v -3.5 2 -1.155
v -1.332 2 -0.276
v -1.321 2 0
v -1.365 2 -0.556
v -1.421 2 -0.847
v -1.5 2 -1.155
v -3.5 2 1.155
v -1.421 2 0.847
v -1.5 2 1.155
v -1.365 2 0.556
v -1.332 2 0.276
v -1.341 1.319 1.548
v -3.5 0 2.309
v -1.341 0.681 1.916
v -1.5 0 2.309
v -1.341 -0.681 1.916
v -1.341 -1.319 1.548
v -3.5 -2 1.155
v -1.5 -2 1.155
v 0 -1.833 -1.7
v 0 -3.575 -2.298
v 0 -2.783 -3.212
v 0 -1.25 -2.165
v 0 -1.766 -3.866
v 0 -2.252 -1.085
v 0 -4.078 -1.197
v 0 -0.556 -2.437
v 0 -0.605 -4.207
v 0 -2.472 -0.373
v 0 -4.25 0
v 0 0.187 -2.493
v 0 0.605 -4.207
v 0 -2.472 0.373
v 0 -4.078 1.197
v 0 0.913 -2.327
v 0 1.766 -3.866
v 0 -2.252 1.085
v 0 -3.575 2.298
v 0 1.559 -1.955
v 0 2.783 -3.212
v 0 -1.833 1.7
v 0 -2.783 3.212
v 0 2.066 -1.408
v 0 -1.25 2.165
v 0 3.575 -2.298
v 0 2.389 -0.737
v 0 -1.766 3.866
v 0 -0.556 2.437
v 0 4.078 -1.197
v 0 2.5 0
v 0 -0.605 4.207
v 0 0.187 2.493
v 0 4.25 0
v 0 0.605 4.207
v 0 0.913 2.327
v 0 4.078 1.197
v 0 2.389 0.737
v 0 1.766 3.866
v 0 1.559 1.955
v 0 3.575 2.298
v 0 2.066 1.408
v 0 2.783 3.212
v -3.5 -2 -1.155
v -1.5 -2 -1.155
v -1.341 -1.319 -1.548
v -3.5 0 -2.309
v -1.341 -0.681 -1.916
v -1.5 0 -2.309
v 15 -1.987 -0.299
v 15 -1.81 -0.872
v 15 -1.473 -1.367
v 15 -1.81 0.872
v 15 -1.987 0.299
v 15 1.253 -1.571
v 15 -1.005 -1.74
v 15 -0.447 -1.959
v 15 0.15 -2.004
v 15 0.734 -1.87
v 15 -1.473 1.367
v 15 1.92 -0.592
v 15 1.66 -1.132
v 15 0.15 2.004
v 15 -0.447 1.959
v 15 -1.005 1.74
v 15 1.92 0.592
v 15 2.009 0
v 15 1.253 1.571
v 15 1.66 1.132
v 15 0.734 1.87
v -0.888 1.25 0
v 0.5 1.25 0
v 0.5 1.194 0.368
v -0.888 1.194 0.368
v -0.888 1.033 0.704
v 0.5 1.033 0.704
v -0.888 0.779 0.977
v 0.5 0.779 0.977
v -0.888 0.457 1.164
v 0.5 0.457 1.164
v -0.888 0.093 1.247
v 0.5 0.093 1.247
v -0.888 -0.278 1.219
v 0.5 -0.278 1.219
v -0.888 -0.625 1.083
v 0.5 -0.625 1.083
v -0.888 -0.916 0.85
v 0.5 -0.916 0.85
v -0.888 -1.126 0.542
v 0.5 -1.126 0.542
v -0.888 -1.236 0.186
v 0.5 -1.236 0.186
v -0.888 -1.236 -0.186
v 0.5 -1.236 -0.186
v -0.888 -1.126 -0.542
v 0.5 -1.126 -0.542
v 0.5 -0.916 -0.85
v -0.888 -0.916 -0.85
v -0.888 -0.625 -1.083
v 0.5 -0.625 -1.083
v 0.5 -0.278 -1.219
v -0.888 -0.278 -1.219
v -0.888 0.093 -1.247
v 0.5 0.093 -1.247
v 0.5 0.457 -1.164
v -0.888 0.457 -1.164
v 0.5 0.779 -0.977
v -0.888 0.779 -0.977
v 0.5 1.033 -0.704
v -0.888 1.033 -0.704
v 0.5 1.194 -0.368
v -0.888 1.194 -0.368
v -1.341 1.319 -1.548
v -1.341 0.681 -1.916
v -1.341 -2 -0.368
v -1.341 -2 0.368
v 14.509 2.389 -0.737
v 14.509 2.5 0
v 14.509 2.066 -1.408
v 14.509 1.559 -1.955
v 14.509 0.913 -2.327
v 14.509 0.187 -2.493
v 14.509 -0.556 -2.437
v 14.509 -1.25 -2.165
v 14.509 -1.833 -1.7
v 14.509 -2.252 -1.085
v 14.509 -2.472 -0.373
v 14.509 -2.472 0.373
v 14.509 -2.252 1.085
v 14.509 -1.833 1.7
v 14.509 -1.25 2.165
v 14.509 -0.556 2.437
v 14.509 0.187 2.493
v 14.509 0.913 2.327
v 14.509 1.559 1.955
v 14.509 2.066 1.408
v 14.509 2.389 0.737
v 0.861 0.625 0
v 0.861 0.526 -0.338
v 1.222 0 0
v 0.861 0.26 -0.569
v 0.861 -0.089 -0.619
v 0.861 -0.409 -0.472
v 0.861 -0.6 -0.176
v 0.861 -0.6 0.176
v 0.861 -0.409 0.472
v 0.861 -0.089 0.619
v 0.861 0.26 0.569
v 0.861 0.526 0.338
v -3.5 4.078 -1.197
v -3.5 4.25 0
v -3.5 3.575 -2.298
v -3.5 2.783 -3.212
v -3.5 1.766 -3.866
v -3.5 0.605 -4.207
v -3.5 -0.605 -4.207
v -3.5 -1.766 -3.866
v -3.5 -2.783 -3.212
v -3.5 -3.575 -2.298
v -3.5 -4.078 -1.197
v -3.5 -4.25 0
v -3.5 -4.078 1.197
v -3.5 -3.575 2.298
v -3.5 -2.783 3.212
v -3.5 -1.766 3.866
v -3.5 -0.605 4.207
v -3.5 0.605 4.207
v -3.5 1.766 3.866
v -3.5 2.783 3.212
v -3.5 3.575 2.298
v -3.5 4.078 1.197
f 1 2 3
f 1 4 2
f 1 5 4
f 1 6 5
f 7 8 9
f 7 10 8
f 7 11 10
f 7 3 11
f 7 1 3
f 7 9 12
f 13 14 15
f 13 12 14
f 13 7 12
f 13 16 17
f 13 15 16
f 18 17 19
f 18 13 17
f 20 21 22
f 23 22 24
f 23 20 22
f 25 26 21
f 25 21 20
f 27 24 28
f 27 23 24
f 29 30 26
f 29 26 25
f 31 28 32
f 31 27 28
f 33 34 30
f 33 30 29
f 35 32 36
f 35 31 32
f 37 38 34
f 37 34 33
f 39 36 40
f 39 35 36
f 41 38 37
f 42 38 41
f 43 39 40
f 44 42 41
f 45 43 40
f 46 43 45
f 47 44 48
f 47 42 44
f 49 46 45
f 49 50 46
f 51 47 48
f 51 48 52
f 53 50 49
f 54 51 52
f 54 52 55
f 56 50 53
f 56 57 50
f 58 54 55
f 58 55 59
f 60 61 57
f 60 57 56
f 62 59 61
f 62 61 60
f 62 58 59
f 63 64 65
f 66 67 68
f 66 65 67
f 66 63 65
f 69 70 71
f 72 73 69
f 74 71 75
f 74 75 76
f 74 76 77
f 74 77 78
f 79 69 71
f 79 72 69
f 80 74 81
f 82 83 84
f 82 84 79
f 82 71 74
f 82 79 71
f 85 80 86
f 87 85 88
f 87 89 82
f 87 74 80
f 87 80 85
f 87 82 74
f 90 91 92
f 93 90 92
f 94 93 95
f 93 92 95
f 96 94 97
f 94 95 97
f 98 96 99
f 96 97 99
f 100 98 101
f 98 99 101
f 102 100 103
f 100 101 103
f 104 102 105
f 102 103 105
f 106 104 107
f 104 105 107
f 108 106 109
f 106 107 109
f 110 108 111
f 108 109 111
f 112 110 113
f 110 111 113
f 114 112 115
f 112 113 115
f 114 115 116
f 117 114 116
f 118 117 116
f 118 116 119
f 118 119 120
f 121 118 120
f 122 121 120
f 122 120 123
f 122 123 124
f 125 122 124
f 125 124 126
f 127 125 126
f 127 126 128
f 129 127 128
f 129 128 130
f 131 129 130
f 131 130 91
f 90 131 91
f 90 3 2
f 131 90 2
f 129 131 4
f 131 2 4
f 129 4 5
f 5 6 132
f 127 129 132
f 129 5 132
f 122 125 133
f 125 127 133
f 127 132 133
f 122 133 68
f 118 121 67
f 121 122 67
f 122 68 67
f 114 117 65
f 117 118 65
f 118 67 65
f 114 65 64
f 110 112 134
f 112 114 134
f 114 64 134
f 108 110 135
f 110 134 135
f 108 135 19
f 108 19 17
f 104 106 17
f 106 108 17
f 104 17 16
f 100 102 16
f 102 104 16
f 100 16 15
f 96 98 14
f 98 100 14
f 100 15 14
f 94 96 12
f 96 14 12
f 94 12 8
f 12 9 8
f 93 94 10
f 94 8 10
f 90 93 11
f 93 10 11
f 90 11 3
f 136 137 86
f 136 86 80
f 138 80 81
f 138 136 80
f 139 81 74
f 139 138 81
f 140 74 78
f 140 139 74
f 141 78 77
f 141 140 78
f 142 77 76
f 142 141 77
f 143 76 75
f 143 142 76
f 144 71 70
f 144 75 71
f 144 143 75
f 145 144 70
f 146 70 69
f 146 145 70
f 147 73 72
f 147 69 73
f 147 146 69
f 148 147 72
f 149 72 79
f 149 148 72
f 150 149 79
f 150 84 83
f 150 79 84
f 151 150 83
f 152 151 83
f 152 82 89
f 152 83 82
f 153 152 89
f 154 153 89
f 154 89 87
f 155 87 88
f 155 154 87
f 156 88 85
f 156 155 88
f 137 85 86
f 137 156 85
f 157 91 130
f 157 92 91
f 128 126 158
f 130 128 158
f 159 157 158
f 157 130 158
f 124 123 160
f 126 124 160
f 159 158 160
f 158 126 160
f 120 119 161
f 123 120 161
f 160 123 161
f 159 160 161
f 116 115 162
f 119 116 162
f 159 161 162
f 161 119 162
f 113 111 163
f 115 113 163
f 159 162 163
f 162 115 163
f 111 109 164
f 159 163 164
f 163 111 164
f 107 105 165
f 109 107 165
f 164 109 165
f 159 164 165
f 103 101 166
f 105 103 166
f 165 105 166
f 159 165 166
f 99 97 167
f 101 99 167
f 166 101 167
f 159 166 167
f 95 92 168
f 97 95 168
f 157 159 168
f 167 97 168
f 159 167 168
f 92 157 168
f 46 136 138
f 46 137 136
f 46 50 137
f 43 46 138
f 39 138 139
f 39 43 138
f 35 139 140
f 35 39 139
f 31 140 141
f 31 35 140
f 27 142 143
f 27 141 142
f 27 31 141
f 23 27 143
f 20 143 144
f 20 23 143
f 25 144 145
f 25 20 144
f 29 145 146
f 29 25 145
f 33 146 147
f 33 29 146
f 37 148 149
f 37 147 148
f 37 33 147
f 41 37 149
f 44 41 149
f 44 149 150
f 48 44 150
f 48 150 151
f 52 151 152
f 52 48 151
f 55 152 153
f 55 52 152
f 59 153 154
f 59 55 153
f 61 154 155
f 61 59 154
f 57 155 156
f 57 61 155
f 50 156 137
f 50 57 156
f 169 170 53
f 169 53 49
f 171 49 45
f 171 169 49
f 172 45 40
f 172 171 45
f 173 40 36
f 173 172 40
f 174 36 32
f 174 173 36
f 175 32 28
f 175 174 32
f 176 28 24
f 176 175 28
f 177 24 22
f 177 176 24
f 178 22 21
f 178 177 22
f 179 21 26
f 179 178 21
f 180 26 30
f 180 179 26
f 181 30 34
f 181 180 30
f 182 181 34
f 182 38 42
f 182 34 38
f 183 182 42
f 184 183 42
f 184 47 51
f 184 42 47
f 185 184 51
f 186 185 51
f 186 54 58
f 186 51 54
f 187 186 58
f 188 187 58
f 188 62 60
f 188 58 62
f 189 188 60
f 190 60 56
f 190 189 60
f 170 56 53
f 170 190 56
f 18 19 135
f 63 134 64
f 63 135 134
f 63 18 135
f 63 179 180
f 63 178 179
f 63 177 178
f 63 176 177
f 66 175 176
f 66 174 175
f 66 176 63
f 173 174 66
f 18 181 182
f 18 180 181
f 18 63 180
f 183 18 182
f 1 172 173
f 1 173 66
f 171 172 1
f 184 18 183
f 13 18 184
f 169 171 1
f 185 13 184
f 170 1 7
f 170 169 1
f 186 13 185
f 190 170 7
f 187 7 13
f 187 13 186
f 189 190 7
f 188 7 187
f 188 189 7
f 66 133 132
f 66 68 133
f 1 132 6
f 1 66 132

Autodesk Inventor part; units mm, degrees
ref_plane "YZ Plane" through (0, 0, 0) normal (1, 0, 0) x (0, 1, 0)
ref_plane "XZ Plane" through (0, 0, 0) normal (0, 1, 0) x (-1, 0, 0)
sketch "草圖1" plane through (0, 0, 0) normal (0, 0, 1) x (1, 0, 0)
  line L0 (1.2217, 0) -> (15, 0)
  line L1 (15, 0) -> (15, 2.5)
  line L2 (15, 2.5) -> (0, 2.5)
  line L3 (0, 2.5) -> (0, 4.25)
  line L4 (0, 4.25) -> (-3.5, 4.25)
  line L5 (-3.5, 4.25) -> (-3.5, 2.3094)
  line L6 (-3.5, 2.3094) -> (-1.5, 2.3094)
  line L7 (-1.5, 2.3094) -> (-0.8884, 1.25)
  line L8 (-7.2, 0) -> (18.7, 0) projected
  line L9 (0, -0.85) -> (0, 5.1) projected
  line L10 (-0.8884, 1.25) -> (0.5, 1.25)
  line L11 (0.5, 1.25) -> (1.2217, 0)
  line L12 (-3.5, 2.3094) -> (-3.5, 0) construction
  dimension "d0" = 3.5
  dimension "d1" = 2
  dimension "d2" = 60
  dimension "d3" = 5
  dimension "d4" = 4.6188
  dimension "d5" = 8.5
  dimension "d15" = 4
  dimension "d16" = 2.5
  dimension "d17" = 15
revolve "本體" add sketch "草圖1" angle 360 about axis through (1.2217, 0, 0) along (1, 0, 0) contours L11 L10 L9 L2 L1 L0 | L10 L7 L6 L5 L4 L3 L9
sketch "草圖2" plane through (-3.5, 0, 0) normal (-1, 0, 0) x (0, 0, 1)
  circle A0 centre (0, 0) radius 2.3094 projected
  line L0 (0, -5.95) -> (0, 5.95) projected
  line L1 (-5.95, 0) -> (5.95, 0) projected
  line L2 (2.3094, 0) -> (1.1547, -2)
  line L3 (1.1547, -2) -> (-1.1547, -2)
  line L4 (-1.1547, -2) -> (-2.3094, 0)
  line L5 (-2.3094, 0) -> (-1.1547, 2)
  line L6 (-1.1547, 2) -> (1.1547, 2)
  line L7 (1.1547, 2) -> (2.3094, 0)
extrude "塞槽" add sketch "草圖2" against normal up to next contours L7 A0 | A0 L2 | L6 L0 A0 | A0 L0 L3 | L0 L6 A0 | A0 L3 L0 | L4 A0 | A0 L5
thread "螺紋" size "M5x0.8" class "6g" standard "ISO Metric profile" length 12.4
chamfer "倒角1" distance 0.4908 distance2 0.4908 1 edges at (15, -2.5, 0) measured on face at (15, -0.7741, -0.6858)
ref_plane "Work Plane1" through (7.5, 0, 0) normal (0, 0.5, 0.8660254) x (1, 0, 0)
equation "\"d7\" = GEL"
equation "\"d9\" = -0.5 * SPD + 0.5 * GD"
equation "\"d12\" = GUL"
equation "\"d0\" = KOH"
equation "\"d1\" = INTI"
equation "\"d3\" = GD"
equation "\"d4\" = 1.1547 * SW"
equation "\"d5\" = KOD"
equation "\"d15\" = INFT"
equation "\"d16\" = SDT"
equation "\"d17\" = NLG"
equation "\"GD\" = NND"
equation "\"NLG\" = 15"
equation "\"GEL\" = 12.4"
equation "\"KOD\" = 8.5"
equation "\"KOH\" = 3.5"
equation "\"GUL\" = 0.61345 * PTC"
equation "\"SW\" = 4"
equation "\"INTI\" = 2"
equation "\"SPD\" = NND - 1.2269 * PTC"
equation "\"SDT\" = 2.5"
equation "\"INFT\" = 4"
equation "\"TOA\" = 30deg"
equation "\"GD1\" = THREADDIA - 1.2269 * PTC"
equation "\"THREADDIA\" = 5"
equation "\"BDM\" = NND"
equation "\"RR\" = 0.5"
equation "\"PTC\" = 0.8"
equation "\"NND\" = 5"
equation "\"SLG\" = 2.6"
equation "\"GAL\" = 0.61345 * PTC"
equation "\"E0\" = 1.155 * SW"
properties part number "CNS 4557 - M5 x 15" material "鋼、軟鋼"
